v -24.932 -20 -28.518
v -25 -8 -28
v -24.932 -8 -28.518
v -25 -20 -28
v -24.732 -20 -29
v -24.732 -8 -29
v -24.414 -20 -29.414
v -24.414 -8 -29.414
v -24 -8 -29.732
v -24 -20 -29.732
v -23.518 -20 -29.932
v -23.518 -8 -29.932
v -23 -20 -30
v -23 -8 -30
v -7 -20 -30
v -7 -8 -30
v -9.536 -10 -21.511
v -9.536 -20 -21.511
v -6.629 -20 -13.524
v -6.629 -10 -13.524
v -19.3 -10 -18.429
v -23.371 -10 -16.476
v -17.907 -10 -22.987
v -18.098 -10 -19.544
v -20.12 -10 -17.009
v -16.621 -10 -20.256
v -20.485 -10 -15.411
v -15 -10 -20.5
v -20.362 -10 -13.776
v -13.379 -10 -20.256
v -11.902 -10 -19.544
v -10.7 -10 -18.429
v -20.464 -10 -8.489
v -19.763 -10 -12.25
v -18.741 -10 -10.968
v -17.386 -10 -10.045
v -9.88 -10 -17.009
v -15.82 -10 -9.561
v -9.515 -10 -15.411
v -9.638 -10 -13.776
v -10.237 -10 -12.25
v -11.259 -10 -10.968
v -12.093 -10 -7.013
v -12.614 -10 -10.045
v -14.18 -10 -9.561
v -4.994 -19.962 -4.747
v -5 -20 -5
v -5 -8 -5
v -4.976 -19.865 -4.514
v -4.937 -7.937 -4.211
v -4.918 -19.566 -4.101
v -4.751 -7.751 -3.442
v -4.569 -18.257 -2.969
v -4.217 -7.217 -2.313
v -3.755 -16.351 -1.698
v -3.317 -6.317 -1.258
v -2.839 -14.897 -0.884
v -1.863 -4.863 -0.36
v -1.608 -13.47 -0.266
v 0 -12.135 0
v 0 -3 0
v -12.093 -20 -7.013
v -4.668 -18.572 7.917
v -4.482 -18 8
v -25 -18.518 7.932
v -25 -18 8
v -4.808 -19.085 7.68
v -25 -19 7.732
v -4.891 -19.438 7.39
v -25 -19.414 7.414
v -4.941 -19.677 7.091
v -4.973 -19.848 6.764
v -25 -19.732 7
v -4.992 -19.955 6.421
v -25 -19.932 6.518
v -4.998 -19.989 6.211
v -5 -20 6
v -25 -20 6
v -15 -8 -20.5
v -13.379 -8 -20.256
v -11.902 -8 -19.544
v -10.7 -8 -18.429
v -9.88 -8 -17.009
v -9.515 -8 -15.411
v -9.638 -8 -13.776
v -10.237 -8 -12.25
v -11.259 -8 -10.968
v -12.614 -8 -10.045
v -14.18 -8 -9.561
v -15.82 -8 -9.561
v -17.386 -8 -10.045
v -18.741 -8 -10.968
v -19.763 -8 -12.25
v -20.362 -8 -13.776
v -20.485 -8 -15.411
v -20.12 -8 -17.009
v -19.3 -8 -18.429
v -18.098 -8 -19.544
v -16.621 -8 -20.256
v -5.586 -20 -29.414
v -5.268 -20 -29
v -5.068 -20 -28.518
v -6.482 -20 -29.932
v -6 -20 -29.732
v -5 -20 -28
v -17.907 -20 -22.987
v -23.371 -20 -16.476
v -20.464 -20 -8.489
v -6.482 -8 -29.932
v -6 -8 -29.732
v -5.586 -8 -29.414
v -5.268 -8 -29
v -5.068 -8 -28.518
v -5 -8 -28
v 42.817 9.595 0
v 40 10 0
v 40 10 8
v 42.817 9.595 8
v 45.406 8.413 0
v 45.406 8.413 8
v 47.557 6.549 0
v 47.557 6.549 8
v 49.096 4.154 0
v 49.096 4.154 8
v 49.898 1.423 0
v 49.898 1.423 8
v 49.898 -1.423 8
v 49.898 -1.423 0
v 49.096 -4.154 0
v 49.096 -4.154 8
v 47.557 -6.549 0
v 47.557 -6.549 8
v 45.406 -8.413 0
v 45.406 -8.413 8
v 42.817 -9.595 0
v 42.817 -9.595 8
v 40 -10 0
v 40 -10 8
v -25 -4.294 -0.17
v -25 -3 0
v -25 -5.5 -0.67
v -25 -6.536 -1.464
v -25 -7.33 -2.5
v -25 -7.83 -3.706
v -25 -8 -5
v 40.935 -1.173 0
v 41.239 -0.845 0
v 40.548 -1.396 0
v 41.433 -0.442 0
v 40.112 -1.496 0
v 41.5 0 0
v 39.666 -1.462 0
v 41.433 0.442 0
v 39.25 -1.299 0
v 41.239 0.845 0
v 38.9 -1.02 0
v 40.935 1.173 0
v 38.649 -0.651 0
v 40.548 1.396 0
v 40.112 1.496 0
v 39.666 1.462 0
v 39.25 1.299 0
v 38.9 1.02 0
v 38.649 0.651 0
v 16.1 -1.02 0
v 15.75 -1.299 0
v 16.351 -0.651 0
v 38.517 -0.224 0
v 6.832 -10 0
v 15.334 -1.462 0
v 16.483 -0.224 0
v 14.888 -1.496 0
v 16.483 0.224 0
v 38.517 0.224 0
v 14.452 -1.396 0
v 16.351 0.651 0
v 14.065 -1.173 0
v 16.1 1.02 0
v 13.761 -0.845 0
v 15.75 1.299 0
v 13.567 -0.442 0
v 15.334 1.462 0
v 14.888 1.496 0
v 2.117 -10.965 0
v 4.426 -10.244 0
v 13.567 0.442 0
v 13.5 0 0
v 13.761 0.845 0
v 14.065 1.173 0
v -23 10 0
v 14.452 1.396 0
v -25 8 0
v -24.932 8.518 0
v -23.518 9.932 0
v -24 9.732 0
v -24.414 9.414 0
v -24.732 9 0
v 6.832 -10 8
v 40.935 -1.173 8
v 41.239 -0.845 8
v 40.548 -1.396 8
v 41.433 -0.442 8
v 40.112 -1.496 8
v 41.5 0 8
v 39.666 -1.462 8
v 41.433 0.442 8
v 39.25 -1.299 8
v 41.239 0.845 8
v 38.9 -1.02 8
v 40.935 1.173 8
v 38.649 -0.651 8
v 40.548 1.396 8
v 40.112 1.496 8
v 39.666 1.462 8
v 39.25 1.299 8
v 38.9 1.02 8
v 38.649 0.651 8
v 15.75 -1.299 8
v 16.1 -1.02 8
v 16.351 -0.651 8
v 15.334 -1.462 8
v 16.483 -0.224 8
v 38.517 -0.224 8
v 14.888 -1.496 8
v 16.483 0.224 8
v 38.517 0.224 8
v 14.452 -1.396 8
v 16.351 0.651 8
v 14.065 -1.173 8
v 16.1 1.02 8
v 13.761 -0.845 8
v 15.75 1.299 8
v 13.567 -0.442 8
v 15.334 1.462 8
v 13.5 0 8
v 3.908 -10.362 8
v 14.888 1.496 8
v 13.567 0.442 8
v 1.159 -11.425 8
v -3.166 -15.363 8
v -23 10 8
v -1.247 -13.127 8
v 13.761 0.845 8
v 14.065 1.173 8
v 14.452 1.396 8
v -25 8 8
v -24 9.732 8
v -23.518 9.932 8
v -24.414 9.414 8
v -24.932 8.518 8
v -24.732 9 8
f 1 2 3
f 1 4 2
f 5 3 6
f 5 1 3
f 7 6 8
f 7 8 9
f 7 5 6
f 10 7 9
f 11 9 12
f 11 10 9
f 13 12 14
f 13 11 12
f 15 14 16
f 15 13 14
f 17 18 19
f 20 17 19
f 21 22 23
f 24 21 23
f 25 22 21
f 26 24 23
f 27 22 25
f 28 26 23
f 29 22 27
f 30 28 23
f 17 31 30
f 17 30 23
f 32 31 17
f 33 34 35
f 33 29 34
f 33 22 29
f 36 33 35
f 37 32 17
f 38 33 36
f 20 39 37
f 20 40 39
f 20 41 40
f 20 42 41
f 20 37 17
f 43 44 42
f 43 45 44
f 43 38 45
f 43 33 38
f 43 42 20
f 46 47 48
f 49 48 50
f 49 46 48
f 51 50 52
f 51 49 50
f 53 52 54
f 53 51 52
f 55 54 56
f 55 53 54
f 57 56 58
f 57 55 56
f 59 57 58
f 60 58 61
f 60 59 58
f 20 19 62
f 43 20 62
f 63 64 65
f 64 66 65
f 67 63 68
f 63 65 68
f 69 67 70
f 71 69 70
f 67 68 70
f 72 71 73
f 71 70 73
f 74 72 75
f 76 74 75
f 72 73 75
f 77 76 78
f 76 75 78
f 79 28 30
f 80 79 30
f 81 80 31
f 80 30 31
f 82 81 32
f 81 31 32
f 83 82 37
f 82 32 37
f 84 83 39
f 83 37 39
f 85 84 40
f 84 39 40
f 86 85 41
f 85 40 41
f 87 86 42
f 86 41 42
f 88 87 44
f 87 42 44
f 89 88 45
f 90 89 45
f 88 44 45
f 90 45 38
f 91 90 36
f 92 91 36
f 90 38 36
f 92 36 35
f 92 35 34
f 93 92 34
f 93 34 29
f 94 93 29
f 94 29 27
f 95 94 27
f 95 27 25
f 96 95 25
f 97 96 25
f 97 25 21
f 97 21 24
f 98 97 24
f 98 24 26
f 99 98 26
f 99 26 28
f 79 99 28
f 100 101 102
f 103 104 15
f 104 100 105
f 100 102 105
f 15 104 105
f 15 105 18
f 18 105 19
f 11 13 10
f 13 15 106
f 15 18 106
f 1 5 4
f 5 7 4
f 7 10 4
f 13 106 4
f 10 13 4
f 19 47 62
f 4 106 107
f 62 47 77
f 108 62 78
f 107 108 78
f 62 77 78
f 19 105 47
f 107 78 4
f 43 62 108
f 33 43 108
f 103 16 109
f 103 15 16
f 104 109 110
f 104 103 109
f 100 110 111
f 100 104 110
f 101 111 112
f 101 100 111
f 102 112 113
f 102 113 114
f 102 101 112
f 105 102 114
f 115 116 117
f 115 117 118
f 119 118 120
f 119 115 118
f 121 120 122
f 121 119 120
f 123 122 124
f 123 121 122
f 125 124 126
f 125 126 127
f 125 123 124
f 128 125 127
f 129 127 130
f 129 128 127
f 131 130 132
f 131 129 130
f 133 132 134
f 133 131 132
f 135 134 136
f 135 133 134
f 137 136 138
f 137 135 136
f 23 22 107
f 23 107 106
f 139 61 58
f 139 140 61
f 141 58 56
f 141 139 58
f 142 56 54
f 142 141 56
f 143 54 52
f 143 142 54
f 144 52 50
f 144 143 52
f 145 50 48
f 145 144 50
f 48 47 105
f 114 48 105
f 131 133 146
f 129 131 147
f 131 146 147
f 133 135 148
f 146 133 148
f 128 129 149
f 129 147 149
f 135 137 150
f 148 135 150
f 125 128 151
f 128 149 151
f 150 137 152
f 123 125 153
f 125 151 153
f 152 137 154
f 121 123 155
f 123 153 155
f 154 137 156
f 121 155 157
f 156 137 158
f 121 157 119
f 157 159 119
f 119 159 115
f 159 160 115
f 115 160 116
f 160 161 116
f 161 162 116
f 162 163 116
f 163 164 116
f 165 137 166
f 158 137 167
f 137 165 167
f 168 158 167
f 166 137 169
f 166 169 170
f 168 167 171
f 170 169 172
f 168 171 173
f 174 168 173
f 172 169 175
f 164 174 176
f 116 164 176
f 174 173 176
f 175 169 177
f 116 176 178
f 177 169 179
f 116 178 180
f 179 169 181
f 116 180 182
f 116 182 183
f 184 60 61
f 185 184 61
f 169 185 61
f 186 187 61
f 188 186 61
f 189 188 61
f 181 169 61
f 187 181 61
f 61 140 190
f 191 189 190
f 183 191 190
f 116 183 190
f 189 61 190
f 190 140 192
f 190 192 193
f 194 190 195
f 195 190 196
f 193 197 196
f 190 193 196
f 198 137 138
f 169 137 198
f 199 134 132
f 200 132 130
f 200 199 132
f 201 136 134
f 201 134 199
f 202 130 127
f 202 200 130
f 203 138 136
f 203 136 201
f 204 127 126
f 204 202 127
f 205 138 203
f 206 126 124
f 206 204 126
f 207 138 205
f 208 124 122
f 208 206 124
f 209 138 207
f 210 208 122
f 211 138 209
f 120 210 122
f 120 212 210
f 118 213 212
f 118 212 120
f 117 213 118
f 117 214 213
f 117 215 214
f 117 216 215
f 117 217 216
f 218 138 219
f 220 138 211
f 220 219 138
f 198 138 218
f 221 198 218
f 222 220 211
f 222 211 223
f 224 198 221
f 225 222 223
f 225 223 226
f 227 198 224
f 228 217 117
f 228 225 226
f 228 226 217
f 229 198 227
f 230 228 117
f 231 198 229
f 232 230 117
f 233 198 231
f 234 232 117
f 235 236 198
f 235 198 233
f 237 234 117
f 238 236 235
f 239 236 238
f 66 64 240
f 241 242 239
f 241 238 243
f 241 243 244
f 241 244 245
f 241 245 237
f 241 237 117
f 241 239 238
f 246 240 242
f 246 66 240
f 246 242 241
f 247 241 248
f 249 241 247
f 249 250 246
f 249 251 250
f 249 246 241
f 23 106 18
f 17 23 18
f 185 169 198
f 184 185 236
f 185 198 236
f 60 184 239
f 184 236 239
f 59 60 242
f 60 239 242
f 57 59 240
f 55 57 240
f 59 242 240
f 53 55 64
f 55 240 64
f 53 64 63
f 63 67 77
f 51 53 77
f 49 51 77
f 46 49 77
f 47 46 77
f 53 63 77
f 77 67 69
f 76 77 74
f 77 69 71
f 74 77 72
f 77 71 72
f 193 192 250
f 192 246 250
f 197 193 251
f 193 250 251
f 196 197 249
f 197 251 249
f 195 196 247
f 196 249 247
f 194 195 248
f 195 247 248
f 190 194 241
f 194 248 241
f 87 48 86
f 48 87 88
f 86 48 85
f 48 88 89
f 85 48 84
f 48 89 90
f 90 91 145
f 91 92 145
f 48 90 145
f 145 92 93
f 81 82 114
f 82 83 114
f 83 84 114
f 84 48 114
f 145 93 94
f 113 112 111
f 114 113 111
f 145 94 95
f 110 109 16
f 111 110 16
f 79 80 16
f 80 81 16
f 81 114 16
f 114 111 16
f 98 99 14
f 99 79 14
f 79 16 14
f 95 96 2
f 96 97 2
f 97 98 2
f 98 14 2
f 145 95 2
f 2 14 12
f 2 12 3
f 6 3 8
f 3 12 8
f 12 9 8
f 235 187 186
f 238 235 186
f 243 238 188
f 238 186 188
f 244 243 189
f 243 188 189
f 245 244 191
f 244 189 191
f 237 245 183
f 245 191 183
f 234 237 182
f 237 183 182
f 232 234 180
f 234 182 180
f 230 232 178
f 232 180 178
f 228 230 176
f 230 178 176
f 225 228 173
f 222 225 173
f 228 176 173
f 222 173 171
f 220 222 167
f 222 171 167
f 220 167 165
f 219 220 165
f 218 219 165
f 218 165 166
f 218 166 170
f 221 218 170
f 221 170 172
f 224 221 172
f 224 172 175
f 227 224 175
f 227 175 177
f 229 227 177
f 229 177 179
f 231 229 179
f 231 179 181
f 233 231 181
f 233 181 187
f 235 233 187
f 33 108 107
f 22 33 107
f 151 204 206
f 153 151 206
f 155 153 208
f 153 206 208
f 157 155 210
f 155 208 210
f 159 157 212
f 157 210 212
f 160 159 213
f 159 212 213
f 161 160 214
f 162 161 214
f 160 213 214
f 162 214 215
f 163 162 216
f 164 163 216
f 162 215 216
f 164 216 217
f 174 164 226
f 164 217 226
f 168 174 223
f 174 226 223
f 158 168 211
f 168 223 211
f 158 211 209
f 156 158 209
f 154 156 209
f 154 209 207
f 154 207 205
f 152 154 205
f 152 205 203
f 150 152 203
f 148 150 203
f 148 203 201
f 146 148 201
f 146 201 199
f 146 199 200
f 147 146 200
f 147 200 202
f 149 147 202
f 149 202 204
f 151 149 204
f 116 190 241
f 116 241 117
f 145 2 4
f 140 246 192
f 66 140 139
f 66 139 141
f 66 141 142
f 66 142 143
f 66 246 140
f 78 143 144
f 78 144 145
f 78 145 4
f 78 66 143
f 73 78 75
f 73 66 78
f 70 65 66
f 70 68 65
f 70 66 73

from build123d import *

# Parameters (mm, degrees)
BOSS_EXTRUDE1_DEPTH      = 8
SKETCH2_R                = 1.5
CUT_EXTRUDE1_DEPTH       = 10
SKETCH3_R                = 1.5
CUT_EXTRUDE2_DEPTH       = 10
BOSS_EXTRUDE3_DEPTH      = 30
BOSS_EXTRUDE3_DEPTH_BACK = 8
SKETCH6_W                = 20
SKETCH6_H                = 10
FILLET3_R                = 12
SKETCH7_W                = 20
SKETCH7_H                = 30
BOSS_EXTRUDE4_DEPTH      = 2
CUT_EXTRUDE3_DEPTH       = 10
SKETCH9_R                = 5.5
CUT_EXTRUDE4_DEPTH       = 10
FILLET4_R                = 5
FILLET5_R                = 2


with BuildPart() as part:
    # Sketch1 → Boss-Extrude1 (new body)
    with BuildSketch(Plane.XY):
        with BuildLine():
            Line((-25, 10), (40, 10))
            ThreePointArc((40, 10), (50, 0), (40, -10))
            Line((40, -10), (-25, -10))
            Line((-25, -10), (-25, 10))
        make_face()
    extrude(amount=BOSS_EXTRUDE1_DEPTH)

    # Sketch2 → Cut-Extrude1 (cut)
    with BuildSketch(Plane.XY.offset(8)):
        with Locations((40, 0)):
            Circle(SKETCH2_R)
    extrude(amount=-CUT_EXTRUDE1_DEPTH, mode=Mode.SUBTRACT)

    # Sketch3 → Cut-Extrude2 (cut)
    with BuildSketch(Plane(origin=(0, 0, 0), x_dir=(-1, 0, 0), z_dir=(0, 0, -1))):
        with Locations((-15, 0)):
            Circle(SKETCH3_R)
    extrude(amount=-CUT_EXTRUDE2_DEPTH, mode=Mode.SUBTRACT)

    # Sketch6 → Boss-Extrude3 (add, two sides: drawn at the far end of the back side and taken through both)
    with BuildSketch(Plane(origin=(0, 0, 0), x_dir=(-1, 0, 0), z_dir=(0, 0, -1)).offset(-BOSS_EXTRUDE3_DEPTH_BACK)):
        with Locations((15, -15)):
            Rectangle(SKETCH6_W, SKETCH6_H)
    extrude(amount=BOSS_EXTRUDE3_DEPTH + BOSS_EXTRUDE3_DEPTH_BACK)

    # Fillet3
    # the kernel refuses this fillet: 12 mm, written as the material it adds along each edge
    with BuildSketch(Plane(origin=(-5, -10, 8), x_dir=(0, -1, 0), z_dir=(0, 0, -1))) as fillet3_piece_1:
        with BuildLine():
            CenterArc((12, -11.832159566), FILLET3_R, 99.594068227, 80.405931773)
            Line((0, -11.832159566), (0, 0))
            Line((0, 0), (10, 0))
        make_face()
    extrude(amount=8)

    # Sketch7 → Boss-Extrude4 (add)
    with BuildSketch(Plane(origin=(0, -10, 0), x_dir=(1, 0, 0), z_dir=(0, 1, 0))):
        with Locations((-15, 15)):
            Rectangle(SKETCH7_W, SKETCH7_H)
    extrude(amount=BOSS_EXTRUDE4_DEPTH)

    # Sketch8 → Cut-Extrude3 (cut)
    with BuildSketch(Plane.XZ.offset(20)):
        Polygon((-12.092828782, -7.012612723), (-20.463694682, -8.488622233), (-23.370865901, -16.47600951), (-17.907171218, -22.987387277), (-9.536305318, -21.511377767), (-6.629134099, -13.52399049), align=None)
    extrude(amount=-CUT_EXTRUDE3_DEPTH, mode=Mode.SUBTRACT)

    # Sketch9 → Cut-Extrude4 (cut)
    with BuildSketch(Plane.XZ.offset(10)):
        with Locations(Location((-15, -15, 0), (0, 0, 270))):
            Circle(SKETCH9_R)
    extrude(amount=-CUT_EXTRUDE4_DEPTH, mode=Mode.SUBTRACT)

    # Fillet4
    # the kernel refuses this fillet: 5 mm, written as the material it adds along each edge
    with BuildSketch(Plane(origin=(-5, -20, 0), x_dir=(1, 0, 0), z_dir=(0, 1, 0))) as fillet4_piece_1_section:
        with BuildLine():
            CenterArc((FILLET4_R, FILLET4_R), FILLET4_R, 180, 90)
            Line((0, FILLET4_R), (0, 0))
            Line((0, 0), (FILLET4_R, 0))
        make_face()
    fillet4_piece_1 = extrude(amount=12, mode=Mode.PRIVATE)
    fillet4_piece_1 = fillet4_piece_1 - Plane(origin=(6.832159566, -22, 0), x_dir=(0, -1, 0), z_dir=(0, 0, 1)) * Cylinder(12, 44, mode=Mode.PRIVATE)
    add(fillet4_piece_1)
    with BuildSketch(Plane(origin=(-25, -8, 0), x_dir=(0, 1, 0), z_dir=(1, 0, 0))) as fillet4_piece_2:
        with BuildLine():
            CenterArc((FILLET4_R, -FILLET4_R), FILLET4_R, 90, 90)
            Line((0, -FILLET4_R), (0, 0))
            Line((0, 0), (FILLET4_R, 0))
        make_face()
    extrude(amount=20)
    with BuildSketch(Plane(origin=(-5, -20, 0), x_dir=(1, 0, 0), z_dir=(0, 1, 0))) as fillet4_piece_3a_section:
        with BuildLine():
            CenterArc((FILLET4_R, FILLET4_R), FILLET4_R, 180, 90)
            Line((0, FILLET4_R), (0, 0))
            Line((0, 0), (FILLET4_R, 0))
        make_face()
    fillet4_piece_3a = extrude(amount=24.5, mode=Mode.PRIVATE)
    fillet4_piece_3a = split(fillet4_piece_3a, bisect_by=Plane(origin=(-5, -8, 0), z_dir=(0, 1, 0)), keep=Keep.TOP, mode=Mode.PRIVATE)
    with BuildSketch(Plane(origin=(-25, -8, 0), x_dir=(0, 1, 0), z_dir=(1, 0, 0))) as fillet4_piece_3b_section:
        with BuildLine():
            CenterArc((FILLET4_R, -FILLET4_R), FILLET4_R, 90, 90)
            Line((0, -FILLET4_R), (0, 0))
            Line((0, 0), (FILLET4_R, 0))
        make_face()
    fillet4_piece_3b = extrude(amount=32.5, mode=Mode.PRIVATE)
    fillet4_piece_3b = split(fillet4_piece_3b, bisect_by=Plane(origin=(-5, -8, 0), z_dir=(1, 0, 0)), keep=Keep.TOP, mode=Mode.PRIVATE)
    fillet4_piece_3 = fillet4_piece_3a & fillet4_piece_3b
    add(fillet4_piece_3)

    # Fillet5
    fillet5_edges = [part.edges().sort_by_distance(p)[0] for p in [
        (-15, -20, 8),
        (-25, -14, -30),
        (-5, -14, -30),
        (-25, 10, 4),
    ]]
    fillet(fillet5_edges, radius=FILLET5_R)


solid = part.part
